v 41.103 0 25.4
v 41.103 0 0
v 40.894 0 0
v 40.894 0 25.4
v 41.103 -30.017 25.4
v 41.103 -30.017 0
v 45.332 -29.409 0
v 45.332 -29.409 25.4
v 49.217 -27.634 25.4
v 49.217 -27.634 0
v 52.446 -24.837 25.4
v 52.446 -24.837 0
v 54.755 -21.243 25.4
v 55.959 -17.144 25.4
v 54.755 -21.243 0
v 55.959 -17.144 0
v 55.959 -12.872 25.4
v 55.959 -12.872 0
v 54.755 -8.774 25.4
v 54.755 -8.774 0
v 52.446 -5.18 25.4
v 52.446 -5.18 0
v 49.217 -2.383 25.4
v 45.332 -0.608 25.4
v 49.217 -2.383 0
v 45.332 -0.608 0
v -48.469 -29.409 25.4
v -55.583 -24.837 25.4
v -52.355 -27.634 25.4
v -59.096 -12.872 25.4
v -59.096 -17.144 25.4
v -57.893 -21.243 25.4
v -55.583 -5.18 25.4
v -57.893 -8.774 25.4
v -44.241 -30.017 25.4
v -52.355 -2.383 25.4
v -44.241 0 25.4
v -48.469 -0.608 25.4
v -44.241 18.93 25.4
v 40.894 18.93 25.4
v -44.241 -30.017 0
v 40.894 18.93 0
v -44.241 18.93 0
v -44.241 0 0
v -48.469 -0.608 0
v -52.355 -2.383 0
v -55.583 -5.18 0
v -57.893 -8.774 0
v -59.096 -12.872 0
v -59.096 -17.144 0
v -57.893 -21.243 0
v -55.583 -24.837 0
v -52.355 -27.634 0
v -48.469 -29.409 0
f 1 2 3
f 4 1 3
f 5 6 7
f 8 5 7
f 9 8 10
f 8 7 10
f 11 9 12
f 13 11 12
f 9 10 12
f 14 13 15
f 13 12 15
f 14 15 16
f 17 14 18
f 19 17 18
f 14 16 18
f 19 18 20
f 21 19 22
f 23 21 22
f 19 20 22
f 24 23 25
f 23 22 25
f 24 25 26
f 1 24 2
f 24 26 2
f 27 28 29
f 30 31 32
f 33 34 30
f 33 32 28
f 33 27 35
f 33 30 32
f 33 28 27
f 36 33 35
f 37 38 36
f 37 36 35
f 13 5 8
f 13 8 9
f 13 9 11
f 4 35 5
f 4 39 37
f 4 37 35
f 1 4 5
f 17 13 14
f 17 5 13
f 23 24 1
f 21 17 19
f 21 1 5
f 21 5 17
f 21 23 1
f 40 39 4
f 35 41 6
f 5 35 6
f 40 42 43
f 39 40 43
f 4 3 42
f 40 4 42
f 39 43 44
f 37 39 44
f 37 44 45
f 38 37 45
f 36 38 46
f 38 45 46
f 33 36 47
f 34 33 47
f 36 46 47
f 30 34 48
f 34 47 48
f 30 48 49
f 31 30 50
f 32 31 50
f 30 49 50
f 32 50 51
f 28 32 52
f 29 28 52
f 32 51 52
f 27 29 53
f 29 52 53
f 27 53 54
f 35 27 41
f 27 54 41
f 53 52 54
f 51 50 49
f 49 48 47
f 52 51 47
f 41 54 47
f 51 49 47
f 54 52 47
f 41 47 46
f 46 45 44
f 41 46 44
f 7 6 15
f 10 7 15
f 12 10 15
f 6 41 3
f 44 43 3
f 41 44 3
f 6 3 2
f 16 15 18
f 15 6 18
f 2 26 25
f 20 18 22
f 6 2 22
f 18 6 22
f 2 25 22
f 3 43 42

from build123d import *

# Parameters (mm, degrees)
F1_DEPTH = 25.4


with BuildPart() as f1:
    # F0 (on Top) → F1 (new body)
    with BuildSketch(Plane.XY):
        with BuildLine():
            ThreePointArc((-44.240825, 0), (-59.249237, -15.008412), (-44.240825, -30.016825))
            Line((-44.240825, -30.016825), (-1.568824, -30.016825))
            Line((-1.568824, -30.016825), (40.475648, -30.016825))
            Line((40.475648, -30.016825), (41.103177, -30.016825))
            ThreePointArc((41.103177, -30.016825), (56.111589, -15.008412), (41.103177, 0))
            Line((41.103177, 0), (40.894002, 0))
            Line((40.894002, 0), (0, 0))
            Line((0, 0), (-1.568824, 0))
            Line((-1.568824, 0), (-44.240825, 0))
        make_face()
        Polygon((-44.240825, 18.930471), (-44.240825, 0), (-1.568824, 0), (0, 0), (40.894002, 0), (40.894002, 18.930471), align=None)
    extrude(amount=F1_DEPTH)


solid = f1.part
